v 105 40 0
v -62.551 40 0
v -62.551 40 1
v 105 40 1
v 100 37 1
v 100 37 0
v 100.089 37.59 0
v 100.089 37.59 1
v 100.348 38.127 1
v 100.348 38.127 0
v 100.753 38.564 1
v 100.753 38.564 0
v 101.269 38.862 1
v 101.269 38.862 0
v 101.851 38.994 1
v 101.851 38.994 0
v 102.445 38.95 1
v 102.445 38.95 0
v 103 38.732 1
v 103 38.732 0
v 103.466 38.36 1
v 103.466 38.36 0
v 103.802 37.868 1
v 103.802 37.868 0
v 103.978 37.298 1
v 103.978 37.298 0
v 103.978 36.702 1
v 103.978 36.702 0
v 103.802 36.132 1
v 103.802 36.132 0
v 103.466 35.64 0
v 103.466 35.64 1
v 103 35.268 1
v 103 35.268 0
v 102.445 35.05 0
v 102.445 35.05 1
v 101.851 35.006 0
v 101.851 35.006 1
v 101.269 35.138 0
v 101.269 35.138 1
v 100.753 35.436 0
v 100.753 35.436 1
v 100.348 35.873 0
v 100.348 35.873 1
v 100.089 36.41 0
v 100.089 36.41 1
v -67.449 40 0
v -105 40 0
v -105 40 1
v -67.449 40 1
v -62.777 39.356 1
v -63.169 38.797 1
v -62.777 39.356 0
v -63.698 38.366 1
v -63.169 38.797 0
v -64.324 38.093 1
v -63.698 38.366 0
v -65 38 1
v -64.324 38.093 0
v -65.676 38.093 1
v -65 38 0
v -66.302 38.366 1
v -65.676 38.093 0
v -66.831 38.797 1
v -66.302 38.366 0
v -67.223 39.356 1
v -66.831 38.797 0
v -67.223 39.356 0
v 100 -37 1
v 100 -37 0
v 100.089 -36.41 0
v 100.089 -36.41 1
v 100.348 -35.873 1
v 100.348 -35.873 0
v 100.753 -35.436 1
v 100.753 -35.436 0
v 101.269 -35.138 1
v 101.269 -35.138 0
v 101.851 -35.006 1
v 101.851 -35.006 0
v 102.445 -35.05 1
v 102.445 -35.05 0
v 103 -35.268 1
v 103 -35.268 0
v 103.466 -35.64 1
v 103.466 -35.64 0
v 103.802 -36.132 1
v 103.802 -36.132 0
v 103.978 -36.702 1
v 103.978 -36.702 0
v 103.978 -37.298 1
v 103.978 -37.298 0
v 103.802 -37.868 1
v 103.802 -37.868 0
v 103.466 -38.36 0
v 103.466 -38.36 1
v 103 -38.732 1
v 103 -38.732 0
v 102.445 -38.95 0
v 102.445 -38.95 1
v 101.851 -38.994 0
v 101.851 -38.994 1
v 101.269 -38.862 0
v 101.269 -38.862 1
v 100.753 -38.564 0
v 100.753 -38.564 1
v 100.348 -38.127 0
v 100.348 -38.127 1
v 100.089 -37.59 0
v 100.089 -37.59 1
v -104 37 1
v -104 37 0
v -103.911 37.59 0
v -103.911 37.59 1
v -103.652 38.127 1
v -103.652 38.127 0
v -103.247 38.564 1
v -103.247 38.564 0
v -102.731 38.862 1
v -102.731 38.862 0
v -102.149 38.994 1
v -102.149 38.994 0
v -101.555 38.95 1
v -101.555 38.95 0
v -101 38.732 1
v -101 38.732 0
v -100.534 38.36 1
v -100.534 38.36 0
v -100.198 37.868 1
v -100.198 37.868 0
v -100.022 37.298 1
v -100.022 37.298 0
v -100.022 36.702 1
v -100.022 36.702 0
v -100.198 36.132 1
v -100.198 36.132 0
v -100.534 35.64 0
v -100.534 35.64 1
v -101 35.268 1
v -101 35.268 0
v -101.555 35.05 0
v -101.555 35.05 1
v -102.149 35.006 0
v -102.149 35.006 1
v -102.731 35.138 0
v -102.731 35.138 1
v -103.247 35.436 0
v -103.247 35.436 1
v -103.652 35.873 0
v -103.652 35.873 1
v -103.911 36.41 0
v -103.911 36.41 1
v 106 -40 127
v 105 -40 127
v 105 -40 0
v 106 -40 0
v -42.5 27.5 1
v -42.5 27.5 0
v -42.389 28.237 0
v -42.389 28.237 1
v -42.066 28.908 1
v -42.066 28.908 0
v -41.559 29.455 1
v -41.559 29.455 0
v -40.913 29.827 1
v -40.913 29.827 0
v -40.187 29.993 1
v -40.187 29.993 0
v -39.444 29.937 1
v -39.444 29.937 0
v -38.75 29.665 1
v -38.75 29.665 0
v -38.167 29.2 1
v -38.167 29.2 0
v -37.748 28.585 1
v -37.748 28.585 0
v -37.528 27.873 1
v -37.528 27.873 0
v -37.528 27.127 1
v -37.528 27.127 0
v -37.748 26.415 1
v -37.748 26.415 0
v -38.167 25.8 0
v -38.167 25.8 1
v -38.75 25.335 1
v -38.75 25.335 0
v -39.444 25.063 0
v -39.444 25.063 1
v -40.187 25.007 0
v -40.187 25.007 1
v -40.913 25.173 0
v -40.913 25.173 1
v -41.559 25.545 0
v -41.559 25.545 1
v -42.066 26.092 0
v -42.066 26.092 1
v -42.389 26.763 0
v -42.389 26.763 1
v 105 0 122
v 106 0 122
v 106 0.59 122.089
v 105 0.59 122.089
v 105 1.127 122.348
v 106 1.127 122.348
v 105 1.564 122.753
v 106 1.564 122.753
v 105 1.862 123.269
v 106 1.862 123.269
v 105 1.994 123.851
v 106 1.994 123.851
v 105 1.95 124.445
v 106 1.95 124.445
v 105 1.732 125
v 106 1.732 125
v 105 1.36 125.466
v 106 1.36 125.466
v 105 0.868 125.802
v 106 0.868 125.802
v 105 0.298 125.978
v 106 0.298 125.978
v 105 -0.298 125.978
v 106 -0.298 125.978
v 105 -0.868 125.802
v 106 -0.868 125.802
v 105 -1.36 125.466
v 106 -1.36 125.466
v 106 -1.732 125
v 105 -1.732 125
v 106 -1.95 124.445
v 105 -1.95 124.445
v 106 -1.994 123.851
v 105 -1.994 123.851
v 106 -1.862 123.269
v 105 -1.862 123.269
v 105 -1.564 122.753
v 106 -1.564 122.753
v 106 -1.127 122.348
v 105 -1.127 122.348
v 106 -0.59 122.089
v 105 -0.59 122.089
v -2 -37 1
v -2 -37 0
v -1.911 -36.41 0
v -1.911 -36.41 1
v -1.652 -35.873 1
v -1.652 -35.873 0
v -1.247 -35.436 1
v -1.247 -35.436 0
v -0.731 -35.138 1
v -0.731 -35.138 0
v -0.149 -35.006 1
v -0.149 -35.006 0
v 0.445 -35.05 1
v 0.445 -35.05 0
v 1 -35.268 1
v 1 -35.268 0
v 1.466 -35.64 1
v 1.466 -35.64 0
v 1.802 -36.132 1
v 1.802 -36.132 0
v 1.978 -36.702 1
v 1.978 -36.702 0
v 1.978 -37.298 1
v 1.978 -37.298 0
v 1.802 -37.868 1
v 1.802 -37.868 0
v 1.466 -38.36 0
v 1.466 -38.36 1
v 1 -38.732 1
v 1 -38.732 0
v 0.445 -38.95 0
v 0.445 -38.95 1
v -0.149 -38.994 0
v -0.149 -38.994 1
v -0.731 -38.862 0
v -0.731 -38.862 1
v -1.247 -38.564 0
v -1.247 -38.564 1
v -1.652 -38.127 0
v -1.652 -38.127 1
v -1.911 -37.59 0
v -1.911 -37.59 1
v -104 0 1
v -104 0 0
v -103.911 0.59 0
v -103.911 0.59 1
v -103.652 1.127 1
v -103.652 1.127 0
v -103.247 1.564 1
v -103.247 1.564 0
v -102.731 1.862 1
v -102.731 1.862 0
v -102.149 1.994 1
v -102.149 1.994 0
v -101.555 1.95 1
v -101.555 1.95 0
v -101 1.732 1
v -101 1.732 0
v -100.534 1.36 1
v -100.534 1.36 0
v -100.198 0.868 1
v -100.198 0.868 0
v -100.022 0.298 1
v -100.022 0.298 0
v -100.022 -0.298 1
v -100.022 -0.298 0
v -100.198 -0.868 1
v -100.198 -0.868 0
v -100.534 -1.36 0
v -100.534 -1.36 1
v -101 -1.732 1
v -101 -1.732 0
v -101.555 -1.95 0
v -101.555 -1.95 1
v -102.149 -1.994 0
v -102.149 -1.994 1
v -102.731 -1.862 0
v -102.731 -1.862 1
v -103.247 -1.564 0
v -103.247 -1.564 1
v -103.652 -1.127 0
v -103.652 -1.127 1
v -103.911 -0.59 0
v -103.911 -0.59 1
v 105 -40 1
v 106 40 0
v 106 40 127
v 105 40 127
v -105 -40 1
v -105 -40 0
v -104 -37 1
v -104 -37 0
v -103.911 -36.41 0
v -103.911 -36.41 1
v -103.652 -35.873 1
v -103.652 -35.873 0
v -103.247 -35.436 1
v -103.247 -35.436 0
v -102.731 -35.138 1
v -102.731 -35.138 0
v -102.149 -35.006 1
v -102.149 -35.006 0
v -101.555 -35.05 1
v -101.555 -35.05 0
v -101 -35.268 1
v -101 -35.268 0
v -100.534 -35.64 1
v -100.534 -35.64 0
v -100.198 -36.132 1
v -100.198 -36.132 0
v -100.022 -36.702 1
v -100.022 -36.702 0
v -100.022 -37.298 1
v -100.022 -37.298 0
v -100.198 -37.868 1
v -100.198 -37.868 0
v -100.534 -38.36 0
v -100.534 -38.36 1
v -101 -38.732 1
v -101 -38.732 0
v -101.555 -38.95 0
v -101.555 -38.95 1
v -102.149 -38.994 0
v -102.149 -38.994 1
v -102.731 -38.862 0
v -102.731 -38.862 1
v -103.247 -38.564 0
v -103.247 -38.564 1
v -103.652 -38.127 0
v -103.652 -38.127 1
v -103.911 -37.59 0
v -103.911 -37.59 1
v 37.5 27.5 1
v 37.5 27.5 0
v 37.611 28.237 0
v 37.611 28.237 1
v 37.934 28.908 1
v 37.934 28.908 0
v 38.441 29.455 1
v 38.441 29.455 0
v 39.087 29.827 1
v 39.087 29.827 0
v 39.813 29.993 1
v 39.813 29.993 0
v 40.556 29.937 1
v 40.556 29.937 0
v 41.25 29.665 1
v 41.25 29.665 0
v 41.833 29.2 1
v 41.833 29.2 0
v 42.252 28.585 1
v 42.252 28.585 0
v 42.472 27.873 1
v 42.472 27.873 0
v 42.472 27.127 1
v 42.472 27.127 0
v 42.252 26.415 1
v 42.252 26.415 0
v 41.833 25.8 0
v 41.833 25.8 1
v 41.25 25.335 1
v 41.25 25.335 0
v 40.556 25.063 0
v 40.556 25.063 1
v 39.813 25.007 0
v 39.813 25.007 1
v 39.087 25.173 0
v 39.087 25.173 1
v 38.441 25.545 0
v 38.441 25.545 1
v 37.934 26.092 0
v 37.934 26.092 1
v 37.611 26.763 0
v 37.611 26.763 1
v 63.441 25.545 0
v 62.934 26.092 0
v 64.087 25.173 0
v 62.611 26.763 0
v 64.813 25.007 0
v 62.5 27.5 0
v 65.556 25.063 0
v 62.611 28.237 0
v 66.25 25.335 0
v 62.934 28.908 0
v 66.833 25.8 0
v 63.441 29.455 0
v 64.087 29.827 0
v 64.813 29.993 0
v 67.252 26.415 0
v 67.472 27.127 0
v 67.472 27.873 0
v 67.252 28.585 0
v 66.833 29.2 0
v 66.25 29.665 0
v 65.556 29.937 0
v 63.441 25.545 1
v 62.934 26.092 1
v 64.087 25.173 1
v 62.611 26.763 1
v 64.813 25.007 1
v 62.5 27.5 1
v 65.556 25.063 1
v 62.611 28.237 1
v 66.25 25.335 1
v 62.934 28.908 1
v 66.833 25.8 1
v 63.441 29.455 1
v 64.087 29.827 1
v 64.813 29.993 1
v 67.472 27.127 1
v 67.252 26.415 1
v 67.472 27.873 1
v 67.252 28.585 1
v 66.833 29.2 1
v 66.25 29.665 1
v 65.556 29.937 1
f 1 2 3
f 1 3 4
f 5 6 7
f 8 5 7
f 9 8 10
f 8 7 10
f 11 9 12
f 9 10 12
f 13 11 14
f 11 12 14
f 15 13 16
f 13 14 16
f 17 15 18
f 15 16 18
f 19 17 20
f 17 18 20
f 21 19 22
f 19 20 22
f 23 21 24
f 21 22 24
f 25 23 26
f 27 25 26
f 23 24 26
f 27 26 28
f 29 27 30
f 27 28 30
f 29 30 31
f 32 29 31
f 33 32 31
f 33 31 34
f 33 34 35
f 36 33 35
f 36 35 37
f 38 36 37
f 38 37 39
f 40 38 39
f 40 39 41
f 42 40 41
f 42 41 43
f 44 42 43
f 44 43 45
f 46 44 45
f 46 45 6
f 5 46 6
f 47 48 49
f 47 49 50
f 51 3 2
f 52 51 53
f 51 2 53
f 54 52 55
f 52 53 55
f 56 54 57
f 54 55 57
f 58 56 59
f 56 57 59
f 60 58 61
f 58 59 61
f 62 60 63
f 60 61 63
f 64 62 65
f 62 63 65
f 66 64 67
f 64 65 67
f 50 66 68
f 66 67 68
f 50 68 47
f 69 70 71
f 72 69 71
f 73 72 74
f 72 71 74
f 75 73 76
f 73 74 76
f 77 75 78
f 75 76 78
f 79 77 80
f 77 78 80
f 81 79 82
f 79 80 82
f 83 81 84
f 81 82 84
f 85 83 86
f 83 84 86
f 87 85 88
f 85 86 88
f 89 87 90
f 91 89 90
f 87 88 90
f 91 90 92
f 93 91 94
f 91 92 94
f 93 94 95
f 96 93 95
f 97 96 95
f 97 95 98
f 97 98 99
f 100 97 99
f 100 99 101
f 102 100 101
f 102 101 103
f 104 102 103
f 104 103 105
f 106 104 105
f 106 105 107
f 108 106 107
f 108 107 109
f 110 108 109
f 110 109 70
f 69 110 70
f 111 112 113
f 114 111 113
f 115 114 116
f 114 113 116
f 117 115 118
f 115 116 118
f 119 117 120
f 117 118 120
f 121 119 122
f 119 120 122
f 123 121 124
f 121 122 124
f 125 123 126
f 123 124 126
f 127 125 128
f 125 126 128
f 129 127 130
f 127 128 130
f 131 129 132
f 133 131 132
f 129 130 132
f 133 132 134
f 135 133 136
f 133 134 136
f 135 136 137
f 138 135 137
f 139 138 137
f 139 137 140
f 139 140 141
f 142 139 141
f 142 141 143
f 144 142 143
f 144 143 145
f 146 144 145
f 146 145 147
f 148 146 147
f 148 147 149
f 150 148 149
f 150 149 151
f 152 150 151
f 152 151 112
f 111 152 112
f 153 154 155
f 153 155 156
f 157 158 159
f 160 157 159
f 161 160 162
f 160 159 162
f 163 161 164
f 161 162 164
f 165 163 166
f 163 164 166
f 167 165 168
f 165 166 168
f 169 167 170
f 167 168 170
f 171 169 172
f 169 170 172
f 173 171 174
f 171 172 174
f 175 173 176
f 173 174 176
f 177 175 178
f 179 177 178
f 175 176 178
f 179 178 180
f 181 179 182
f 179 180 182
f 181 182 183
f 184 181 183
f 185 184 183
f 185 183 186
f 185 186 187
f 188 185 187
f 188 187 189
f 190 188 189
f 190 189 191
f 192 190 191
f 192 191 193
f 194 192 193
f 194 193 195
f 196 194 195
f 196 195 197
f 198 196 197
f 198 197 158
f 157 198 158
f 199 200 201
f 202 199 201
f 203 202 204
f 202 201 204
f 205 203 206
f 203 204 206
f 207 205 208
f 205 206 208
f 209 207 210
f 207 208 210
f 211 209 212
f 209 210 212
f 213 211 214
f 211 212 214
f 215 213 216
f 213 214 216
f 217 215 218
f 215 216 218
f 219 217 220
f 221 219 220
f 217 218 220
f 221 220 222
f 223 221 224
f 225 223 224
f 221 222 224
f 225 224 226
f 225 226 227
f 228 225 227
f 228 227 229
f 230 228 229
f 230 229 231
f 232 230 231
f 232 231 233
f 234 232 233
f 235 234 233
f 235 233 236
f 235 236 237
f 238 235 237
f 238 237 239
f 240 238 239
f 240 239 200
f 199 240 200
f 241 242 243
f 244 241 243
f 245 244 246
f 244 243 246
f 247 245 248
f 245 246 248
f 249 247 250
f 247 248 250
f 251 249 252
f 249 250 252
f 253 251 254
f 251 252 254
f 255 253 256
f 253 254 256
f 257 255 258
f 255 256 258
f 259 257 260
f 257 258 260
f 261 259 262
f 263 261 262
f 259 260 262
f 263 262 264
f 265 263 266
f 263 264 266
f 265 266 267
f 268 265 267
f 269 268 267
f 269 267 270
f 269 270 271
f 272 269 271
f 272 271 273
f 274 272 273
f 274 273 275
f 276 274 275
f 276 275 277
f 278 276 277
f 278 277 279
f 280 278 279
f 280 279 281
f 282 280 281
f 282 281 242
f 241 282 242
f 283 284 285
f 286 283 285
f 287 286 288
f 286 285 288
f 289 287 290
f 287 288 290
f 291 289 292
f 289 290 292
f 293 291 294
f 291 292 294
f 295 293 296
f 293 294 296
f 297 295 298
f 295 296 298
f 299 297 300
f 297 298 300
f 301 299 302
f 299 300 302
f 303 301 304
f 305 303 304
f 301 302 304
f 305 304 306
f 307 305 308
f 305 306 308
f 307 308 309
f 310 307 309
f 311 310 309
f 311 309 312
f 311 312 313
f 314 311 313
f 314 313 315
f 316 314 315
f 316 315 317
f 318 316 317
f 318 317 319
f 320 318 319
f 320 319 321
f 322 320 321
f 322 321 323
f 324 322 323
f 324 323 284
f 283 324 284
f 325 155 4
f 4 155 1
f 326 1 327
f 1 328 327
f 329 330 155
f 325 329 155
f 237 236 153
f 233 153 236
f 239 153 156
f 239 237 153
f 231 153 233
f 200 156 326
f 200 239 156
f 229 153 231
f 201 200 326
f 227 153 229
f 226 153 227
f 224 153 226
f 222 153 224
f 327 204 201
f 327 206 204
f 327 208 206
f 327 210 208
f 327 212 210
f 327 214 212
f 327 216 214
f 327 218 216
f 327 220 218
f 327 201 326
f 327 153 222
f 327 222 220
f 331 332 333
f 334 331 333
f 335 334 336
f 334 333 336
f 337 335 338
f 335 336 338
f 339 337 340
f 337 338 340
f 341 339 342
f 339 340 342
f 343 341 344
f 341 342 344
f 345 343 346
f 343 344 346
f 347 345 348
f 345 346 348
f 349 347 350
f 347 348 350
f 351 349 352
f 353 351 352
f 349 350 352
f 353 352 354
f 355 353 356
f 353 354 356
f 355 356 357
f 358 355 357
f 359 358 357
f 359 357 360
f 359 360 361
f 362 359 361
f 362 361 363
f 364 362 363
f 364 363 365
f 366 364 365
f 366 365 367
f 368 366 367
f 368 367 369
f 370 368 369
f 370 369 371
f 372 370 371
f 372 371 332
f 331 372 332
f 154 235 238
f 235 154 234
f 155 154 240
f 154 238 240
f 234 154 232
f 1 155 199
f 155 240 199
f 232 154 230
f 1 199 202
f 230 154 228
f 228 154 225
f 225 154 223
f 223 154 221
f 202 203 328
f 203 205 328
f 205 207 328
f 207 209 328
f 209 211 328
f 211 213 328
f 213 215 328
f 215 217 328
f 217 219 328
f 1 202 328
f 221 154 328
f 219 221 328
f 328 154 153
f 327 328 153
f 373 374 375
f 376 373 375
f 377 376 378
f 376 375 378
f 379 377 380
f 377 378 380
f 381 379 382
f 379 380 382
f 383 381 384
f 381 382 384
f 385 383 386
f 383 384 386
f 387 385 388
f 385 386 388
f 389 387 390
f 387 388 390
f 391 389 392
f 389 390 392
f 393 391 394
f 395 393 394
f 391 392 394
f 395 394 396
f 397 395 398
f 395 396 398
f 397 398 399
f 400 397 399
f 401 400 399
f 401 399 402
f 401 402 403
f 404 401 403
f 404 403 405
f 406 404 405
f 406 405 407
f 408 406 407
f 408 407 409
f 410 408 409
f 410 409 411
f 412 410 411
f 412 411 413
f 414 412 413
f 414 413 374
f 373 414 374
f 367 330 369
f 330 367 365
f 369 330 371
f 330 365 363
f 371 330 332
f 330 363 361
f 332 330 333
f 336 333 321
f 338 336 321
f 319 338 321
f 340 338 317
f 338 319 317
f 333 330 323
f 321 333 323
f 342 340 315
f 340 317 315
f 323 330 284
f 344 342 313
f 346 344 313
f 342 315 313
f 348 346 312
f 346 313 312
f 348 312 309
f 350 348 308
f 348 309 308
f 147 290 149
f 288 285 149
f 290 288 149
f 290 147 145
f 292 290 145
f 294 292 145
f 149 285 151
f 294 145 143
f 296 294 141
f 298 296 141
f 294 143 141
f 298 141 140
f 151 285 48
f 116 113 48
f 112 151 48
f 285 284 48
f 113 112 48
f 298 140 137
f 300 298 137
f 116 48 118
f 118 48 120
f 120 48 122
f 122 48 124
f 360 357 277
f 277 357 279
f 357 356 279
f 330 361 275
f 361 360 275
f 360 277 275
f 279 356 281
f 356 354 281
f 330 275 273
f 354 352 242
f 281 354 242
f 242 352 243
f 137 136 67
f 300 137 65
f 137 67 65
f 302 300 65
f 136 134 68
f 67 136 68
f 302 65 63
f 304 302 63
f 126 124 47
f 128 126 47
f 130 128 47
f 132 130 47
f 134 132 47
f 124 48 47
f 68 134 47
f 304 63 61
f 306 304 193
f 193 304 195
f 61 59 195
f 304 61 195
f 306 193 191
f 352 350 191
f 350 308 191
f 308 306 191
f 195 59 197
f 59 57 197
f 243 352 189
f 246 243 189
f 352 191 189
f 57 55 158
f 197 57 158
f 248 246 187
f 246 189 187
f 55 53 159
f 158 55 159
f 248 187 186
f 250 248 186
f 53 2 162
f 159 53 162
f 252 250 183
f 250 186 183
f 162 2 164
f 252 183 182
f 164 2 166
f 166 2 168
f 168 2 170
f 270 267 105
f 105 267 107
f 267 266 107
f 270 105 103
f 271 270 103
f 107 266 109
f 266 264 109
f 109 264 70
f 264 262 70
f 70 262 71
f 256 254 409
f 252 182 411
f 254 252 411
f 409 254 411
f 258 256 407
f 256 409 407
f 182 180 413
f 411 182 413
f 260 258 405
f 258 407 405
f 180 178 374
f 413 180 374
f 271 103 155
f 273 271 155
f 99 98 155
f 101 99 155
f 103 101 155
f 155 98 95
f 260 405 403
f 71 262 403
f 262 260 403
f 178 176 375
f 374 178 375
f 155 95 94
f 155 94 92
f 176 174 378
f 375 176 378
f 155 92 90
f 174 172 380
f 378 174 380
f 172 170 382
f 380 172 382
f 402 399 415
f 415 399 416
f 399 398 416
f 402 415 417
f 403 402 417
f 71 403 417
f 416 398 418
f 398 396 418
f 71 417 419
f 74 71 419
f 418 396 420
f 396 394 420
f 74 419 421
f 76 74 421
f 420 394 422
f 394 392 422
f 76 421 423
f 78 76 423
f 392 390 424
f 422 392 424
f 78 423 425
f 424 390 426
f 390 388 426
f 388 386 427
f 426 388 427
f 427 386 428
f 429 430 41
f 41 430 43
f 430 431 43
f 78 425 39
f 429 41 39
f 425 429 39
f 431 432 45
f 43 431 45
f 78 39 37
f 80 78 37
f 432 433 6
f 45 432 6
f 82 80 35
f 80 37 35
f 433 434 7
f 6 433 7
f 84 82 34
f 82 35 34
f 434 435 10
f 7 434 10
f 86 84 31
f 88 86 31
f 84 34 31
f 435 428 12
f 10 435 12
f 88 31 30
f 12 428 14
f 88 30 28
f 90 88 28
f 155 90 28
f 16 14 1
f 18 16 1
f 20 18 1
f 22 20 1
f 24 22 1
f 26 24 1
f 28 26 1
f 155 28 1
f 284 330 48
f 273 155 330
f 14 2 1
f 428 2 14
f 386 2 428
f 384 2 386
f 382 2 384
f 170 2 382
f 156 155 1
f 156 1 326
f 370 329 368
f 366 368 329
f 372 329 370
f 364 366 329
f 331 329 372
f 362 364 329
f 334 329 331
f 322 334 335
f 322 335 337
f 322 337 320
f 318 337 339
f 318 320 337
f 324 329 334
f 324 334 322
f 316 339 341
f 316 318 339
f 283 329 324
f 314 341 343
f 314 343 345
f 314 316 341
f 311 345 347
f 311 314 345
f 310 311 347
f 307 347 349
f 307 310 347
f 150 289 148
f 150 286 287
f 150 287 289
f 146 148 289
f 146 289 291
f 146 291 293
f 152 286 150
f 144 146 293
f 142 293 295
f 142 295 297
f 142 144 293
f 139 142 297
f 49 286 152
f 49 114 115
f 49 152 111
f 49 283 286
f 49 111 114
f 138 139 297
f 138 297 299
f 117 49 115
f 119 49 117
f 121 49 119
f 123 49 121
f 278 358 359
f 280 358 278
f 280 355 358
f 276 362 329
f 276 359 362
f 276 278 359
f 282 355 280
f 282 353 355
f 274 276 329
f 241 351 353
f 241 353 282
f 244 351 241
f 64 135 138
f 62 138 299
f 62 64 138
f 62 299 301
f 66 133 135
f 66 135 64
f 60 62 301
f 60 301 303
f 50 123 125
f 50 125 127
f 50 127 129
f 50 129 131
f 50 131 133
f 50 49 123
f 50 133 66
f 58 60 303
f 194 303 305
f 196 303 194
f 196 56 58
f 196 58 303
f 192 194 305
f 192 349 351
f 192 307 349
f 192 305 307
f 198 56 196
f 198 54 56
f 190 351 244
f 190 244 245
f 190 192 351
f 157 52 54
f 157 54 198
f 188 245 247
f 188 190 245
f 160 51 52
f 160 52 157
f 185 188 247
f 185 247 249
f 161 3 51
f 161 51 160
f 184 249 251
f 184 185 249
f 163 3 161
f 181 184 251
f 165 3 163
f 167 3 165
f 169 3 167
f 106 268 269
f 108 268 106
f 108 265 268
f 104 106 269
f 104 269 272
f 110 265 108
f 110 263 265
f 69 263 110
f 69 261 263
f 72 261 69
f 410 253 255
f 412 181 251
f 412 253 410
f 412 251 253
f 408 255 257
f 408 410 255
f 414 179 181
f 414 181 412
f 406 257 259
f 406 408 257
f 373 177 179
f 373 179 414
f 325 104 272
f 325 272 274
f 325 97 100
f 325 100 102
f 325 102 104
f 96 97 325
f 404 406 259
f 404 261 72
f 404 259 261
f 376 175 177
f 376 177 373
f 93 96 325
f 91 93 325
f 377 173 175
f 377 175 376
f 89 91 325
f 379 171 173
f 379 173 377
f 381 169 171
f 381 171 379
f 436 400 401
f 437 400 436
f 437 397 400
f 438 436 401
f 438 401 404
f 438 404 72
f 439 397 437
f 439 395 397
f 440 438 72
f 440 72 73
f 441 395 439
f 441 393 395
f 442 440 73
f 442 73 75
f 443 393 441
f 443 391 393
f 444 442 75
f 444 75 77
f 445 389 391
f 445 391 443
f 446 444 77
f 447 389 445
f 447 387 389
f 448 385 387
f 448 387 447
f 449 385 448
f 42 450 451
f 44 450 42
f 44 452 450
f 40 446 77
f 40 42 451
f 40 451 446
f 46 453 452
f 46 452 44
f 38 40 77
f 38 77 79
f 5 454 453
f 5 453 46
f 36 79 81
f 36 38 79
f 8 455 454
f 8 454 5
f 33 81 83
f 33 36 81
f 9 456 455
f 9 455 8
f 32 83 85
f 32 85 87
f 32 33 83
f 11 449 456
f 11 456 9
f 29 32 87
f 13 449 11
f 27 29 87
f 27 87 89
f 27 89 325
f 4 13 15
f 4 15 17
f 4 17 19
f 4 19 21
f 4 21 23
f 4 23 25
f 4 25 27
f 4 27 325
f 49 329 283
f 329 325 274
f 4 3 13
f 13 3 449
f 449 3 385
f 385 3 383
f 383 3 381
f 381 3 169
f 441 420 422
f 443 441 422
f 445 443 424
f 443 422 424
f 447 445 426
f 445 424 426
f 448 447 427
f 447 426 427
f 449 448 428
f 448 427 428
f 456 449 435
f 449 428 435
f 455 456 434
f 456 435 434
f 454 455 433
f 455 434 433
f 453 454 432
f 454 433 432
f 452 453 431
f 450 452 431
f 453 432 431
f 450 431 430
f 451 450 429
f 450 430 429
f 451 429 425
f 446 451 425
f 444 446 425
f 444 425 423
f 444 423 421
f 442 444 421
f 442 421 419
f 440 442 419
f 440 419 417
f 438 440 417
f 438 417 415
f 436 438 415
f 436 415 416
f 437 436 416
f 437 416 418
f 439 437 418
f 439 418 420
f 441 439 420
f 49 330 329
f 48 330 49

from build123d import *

# Parameters (mm, degrees)
SKETCH_1_W           = 210
SKETCH_1_H           = 80
EXTRUDE_1_DEPTH      = 1
SKETCH_2_W           = 1
SKETCH_2_H           = 80
EXTRUDE_2_DEPTH      = 126
EXTRUDE_2_DEPTH_BACK = 1
SKETCH_3_R           = 2
CUT_EXTRUDE_1_DEPTH  = 2
SKETCH_5_R           = 2
CUT_EXTRUDE_2_DEPTH  = 2
SKETCH_6_R           = 2.5
CUT_EXTRUDE_3_DEPTH  = 2


with BuildPart() as part:
    # 草图1 → 凸台-拉伸1 (new body)
    with BuildSketch(Plane.XY):
        Rectangle(SKETCH_1_W, SKETCH_1_H)
    extrude(amount=EXTRUDE_1_DEPTH)

    # 草图3 → 切除-拉伸1 (cut)
    with BuildSketch(Plane(origin=(0, 0, 0), x_dir=(-1, 0, 0), z_dir=(0, 0, -1))):
        with Locations((102, 0)):
            Circle(SKETCH_3_R)
        with Locations((102, 37)):
            Circle(SKETCH_3_R)
        with Locations((102, -37)):
            Circle(SKETCH_3_R)
        with Locations((-102, 37)):
            Circle(SKETCH_3_R)
        with Locations((0, -37)):
            Circle(SKETCH_3_R)
        with Locations((-102, -37)):
            Circle(SKETCH_3_R)
    extrude(amount=-CUT_EXTRUDE_1_DEPTH, mode=Mode.SUBTRACT)

    # 草图6 → 切除-拉伸3 (cut)
    with BuildSketch(Plane(origin=(0, 0, 0), x_dir=(-1, 0, 0), z_dir=(0, 0, -1))):
        with Locations((-65, 27.5)):
            Circle(SKETCH_6_R)
        with Locations((-40, 27.5)):
            Circle(SKETCH_6_R)
        with Locations((40, 27.5)):
            Circle(SKETCH_6_R)
        with Locations((65, 40.5)):
            Circle(SKETCH_6_R)
    extrude(amount=-CUT_EXTRUDE_3_DEPTH, mode=Mode.SUBTRACT)


with BuildPart() as body_2:
    # 草图2 → 凸台-拉伸2 (new body, two sides)
    with BuildSketch(Plane.XY.offset(1)) as extrude_2_sk:
        with Locations((105.5, 0)):
            Rectangle(SKETCH_2_W, SKETCH_2_H)
    extrude(amount=EXTRUDE_2_DEPTH)
    extrude(extrude_2_sk.sketch, amount=-EXTRUDE_2_DEPTH_BACK)

    # 草图5 → 切除-拉伸2 (cut)
    with BuildSketch(Plane(origin=(106, 0, 0), x_dir=(0, 0, -1), z_dir=(1, 0, 0))):
        with Locations((-124, 50)):
            Circle(SKETCH_5_R)
        with Locations((-64, -50)):
            Circle(SKETCH_5_R)
        with Locations((-4, -50)):
            Circle(SKETCH_5_R)
        with Locations((-124, 0)):
            Circle(SKETCH_5_R)
    extrude(amount=-CUT_EXTRUDE_2_DEPTH, mode=Mode.SUBTRACT)


solid = Compound([part.part, body_2.part])
